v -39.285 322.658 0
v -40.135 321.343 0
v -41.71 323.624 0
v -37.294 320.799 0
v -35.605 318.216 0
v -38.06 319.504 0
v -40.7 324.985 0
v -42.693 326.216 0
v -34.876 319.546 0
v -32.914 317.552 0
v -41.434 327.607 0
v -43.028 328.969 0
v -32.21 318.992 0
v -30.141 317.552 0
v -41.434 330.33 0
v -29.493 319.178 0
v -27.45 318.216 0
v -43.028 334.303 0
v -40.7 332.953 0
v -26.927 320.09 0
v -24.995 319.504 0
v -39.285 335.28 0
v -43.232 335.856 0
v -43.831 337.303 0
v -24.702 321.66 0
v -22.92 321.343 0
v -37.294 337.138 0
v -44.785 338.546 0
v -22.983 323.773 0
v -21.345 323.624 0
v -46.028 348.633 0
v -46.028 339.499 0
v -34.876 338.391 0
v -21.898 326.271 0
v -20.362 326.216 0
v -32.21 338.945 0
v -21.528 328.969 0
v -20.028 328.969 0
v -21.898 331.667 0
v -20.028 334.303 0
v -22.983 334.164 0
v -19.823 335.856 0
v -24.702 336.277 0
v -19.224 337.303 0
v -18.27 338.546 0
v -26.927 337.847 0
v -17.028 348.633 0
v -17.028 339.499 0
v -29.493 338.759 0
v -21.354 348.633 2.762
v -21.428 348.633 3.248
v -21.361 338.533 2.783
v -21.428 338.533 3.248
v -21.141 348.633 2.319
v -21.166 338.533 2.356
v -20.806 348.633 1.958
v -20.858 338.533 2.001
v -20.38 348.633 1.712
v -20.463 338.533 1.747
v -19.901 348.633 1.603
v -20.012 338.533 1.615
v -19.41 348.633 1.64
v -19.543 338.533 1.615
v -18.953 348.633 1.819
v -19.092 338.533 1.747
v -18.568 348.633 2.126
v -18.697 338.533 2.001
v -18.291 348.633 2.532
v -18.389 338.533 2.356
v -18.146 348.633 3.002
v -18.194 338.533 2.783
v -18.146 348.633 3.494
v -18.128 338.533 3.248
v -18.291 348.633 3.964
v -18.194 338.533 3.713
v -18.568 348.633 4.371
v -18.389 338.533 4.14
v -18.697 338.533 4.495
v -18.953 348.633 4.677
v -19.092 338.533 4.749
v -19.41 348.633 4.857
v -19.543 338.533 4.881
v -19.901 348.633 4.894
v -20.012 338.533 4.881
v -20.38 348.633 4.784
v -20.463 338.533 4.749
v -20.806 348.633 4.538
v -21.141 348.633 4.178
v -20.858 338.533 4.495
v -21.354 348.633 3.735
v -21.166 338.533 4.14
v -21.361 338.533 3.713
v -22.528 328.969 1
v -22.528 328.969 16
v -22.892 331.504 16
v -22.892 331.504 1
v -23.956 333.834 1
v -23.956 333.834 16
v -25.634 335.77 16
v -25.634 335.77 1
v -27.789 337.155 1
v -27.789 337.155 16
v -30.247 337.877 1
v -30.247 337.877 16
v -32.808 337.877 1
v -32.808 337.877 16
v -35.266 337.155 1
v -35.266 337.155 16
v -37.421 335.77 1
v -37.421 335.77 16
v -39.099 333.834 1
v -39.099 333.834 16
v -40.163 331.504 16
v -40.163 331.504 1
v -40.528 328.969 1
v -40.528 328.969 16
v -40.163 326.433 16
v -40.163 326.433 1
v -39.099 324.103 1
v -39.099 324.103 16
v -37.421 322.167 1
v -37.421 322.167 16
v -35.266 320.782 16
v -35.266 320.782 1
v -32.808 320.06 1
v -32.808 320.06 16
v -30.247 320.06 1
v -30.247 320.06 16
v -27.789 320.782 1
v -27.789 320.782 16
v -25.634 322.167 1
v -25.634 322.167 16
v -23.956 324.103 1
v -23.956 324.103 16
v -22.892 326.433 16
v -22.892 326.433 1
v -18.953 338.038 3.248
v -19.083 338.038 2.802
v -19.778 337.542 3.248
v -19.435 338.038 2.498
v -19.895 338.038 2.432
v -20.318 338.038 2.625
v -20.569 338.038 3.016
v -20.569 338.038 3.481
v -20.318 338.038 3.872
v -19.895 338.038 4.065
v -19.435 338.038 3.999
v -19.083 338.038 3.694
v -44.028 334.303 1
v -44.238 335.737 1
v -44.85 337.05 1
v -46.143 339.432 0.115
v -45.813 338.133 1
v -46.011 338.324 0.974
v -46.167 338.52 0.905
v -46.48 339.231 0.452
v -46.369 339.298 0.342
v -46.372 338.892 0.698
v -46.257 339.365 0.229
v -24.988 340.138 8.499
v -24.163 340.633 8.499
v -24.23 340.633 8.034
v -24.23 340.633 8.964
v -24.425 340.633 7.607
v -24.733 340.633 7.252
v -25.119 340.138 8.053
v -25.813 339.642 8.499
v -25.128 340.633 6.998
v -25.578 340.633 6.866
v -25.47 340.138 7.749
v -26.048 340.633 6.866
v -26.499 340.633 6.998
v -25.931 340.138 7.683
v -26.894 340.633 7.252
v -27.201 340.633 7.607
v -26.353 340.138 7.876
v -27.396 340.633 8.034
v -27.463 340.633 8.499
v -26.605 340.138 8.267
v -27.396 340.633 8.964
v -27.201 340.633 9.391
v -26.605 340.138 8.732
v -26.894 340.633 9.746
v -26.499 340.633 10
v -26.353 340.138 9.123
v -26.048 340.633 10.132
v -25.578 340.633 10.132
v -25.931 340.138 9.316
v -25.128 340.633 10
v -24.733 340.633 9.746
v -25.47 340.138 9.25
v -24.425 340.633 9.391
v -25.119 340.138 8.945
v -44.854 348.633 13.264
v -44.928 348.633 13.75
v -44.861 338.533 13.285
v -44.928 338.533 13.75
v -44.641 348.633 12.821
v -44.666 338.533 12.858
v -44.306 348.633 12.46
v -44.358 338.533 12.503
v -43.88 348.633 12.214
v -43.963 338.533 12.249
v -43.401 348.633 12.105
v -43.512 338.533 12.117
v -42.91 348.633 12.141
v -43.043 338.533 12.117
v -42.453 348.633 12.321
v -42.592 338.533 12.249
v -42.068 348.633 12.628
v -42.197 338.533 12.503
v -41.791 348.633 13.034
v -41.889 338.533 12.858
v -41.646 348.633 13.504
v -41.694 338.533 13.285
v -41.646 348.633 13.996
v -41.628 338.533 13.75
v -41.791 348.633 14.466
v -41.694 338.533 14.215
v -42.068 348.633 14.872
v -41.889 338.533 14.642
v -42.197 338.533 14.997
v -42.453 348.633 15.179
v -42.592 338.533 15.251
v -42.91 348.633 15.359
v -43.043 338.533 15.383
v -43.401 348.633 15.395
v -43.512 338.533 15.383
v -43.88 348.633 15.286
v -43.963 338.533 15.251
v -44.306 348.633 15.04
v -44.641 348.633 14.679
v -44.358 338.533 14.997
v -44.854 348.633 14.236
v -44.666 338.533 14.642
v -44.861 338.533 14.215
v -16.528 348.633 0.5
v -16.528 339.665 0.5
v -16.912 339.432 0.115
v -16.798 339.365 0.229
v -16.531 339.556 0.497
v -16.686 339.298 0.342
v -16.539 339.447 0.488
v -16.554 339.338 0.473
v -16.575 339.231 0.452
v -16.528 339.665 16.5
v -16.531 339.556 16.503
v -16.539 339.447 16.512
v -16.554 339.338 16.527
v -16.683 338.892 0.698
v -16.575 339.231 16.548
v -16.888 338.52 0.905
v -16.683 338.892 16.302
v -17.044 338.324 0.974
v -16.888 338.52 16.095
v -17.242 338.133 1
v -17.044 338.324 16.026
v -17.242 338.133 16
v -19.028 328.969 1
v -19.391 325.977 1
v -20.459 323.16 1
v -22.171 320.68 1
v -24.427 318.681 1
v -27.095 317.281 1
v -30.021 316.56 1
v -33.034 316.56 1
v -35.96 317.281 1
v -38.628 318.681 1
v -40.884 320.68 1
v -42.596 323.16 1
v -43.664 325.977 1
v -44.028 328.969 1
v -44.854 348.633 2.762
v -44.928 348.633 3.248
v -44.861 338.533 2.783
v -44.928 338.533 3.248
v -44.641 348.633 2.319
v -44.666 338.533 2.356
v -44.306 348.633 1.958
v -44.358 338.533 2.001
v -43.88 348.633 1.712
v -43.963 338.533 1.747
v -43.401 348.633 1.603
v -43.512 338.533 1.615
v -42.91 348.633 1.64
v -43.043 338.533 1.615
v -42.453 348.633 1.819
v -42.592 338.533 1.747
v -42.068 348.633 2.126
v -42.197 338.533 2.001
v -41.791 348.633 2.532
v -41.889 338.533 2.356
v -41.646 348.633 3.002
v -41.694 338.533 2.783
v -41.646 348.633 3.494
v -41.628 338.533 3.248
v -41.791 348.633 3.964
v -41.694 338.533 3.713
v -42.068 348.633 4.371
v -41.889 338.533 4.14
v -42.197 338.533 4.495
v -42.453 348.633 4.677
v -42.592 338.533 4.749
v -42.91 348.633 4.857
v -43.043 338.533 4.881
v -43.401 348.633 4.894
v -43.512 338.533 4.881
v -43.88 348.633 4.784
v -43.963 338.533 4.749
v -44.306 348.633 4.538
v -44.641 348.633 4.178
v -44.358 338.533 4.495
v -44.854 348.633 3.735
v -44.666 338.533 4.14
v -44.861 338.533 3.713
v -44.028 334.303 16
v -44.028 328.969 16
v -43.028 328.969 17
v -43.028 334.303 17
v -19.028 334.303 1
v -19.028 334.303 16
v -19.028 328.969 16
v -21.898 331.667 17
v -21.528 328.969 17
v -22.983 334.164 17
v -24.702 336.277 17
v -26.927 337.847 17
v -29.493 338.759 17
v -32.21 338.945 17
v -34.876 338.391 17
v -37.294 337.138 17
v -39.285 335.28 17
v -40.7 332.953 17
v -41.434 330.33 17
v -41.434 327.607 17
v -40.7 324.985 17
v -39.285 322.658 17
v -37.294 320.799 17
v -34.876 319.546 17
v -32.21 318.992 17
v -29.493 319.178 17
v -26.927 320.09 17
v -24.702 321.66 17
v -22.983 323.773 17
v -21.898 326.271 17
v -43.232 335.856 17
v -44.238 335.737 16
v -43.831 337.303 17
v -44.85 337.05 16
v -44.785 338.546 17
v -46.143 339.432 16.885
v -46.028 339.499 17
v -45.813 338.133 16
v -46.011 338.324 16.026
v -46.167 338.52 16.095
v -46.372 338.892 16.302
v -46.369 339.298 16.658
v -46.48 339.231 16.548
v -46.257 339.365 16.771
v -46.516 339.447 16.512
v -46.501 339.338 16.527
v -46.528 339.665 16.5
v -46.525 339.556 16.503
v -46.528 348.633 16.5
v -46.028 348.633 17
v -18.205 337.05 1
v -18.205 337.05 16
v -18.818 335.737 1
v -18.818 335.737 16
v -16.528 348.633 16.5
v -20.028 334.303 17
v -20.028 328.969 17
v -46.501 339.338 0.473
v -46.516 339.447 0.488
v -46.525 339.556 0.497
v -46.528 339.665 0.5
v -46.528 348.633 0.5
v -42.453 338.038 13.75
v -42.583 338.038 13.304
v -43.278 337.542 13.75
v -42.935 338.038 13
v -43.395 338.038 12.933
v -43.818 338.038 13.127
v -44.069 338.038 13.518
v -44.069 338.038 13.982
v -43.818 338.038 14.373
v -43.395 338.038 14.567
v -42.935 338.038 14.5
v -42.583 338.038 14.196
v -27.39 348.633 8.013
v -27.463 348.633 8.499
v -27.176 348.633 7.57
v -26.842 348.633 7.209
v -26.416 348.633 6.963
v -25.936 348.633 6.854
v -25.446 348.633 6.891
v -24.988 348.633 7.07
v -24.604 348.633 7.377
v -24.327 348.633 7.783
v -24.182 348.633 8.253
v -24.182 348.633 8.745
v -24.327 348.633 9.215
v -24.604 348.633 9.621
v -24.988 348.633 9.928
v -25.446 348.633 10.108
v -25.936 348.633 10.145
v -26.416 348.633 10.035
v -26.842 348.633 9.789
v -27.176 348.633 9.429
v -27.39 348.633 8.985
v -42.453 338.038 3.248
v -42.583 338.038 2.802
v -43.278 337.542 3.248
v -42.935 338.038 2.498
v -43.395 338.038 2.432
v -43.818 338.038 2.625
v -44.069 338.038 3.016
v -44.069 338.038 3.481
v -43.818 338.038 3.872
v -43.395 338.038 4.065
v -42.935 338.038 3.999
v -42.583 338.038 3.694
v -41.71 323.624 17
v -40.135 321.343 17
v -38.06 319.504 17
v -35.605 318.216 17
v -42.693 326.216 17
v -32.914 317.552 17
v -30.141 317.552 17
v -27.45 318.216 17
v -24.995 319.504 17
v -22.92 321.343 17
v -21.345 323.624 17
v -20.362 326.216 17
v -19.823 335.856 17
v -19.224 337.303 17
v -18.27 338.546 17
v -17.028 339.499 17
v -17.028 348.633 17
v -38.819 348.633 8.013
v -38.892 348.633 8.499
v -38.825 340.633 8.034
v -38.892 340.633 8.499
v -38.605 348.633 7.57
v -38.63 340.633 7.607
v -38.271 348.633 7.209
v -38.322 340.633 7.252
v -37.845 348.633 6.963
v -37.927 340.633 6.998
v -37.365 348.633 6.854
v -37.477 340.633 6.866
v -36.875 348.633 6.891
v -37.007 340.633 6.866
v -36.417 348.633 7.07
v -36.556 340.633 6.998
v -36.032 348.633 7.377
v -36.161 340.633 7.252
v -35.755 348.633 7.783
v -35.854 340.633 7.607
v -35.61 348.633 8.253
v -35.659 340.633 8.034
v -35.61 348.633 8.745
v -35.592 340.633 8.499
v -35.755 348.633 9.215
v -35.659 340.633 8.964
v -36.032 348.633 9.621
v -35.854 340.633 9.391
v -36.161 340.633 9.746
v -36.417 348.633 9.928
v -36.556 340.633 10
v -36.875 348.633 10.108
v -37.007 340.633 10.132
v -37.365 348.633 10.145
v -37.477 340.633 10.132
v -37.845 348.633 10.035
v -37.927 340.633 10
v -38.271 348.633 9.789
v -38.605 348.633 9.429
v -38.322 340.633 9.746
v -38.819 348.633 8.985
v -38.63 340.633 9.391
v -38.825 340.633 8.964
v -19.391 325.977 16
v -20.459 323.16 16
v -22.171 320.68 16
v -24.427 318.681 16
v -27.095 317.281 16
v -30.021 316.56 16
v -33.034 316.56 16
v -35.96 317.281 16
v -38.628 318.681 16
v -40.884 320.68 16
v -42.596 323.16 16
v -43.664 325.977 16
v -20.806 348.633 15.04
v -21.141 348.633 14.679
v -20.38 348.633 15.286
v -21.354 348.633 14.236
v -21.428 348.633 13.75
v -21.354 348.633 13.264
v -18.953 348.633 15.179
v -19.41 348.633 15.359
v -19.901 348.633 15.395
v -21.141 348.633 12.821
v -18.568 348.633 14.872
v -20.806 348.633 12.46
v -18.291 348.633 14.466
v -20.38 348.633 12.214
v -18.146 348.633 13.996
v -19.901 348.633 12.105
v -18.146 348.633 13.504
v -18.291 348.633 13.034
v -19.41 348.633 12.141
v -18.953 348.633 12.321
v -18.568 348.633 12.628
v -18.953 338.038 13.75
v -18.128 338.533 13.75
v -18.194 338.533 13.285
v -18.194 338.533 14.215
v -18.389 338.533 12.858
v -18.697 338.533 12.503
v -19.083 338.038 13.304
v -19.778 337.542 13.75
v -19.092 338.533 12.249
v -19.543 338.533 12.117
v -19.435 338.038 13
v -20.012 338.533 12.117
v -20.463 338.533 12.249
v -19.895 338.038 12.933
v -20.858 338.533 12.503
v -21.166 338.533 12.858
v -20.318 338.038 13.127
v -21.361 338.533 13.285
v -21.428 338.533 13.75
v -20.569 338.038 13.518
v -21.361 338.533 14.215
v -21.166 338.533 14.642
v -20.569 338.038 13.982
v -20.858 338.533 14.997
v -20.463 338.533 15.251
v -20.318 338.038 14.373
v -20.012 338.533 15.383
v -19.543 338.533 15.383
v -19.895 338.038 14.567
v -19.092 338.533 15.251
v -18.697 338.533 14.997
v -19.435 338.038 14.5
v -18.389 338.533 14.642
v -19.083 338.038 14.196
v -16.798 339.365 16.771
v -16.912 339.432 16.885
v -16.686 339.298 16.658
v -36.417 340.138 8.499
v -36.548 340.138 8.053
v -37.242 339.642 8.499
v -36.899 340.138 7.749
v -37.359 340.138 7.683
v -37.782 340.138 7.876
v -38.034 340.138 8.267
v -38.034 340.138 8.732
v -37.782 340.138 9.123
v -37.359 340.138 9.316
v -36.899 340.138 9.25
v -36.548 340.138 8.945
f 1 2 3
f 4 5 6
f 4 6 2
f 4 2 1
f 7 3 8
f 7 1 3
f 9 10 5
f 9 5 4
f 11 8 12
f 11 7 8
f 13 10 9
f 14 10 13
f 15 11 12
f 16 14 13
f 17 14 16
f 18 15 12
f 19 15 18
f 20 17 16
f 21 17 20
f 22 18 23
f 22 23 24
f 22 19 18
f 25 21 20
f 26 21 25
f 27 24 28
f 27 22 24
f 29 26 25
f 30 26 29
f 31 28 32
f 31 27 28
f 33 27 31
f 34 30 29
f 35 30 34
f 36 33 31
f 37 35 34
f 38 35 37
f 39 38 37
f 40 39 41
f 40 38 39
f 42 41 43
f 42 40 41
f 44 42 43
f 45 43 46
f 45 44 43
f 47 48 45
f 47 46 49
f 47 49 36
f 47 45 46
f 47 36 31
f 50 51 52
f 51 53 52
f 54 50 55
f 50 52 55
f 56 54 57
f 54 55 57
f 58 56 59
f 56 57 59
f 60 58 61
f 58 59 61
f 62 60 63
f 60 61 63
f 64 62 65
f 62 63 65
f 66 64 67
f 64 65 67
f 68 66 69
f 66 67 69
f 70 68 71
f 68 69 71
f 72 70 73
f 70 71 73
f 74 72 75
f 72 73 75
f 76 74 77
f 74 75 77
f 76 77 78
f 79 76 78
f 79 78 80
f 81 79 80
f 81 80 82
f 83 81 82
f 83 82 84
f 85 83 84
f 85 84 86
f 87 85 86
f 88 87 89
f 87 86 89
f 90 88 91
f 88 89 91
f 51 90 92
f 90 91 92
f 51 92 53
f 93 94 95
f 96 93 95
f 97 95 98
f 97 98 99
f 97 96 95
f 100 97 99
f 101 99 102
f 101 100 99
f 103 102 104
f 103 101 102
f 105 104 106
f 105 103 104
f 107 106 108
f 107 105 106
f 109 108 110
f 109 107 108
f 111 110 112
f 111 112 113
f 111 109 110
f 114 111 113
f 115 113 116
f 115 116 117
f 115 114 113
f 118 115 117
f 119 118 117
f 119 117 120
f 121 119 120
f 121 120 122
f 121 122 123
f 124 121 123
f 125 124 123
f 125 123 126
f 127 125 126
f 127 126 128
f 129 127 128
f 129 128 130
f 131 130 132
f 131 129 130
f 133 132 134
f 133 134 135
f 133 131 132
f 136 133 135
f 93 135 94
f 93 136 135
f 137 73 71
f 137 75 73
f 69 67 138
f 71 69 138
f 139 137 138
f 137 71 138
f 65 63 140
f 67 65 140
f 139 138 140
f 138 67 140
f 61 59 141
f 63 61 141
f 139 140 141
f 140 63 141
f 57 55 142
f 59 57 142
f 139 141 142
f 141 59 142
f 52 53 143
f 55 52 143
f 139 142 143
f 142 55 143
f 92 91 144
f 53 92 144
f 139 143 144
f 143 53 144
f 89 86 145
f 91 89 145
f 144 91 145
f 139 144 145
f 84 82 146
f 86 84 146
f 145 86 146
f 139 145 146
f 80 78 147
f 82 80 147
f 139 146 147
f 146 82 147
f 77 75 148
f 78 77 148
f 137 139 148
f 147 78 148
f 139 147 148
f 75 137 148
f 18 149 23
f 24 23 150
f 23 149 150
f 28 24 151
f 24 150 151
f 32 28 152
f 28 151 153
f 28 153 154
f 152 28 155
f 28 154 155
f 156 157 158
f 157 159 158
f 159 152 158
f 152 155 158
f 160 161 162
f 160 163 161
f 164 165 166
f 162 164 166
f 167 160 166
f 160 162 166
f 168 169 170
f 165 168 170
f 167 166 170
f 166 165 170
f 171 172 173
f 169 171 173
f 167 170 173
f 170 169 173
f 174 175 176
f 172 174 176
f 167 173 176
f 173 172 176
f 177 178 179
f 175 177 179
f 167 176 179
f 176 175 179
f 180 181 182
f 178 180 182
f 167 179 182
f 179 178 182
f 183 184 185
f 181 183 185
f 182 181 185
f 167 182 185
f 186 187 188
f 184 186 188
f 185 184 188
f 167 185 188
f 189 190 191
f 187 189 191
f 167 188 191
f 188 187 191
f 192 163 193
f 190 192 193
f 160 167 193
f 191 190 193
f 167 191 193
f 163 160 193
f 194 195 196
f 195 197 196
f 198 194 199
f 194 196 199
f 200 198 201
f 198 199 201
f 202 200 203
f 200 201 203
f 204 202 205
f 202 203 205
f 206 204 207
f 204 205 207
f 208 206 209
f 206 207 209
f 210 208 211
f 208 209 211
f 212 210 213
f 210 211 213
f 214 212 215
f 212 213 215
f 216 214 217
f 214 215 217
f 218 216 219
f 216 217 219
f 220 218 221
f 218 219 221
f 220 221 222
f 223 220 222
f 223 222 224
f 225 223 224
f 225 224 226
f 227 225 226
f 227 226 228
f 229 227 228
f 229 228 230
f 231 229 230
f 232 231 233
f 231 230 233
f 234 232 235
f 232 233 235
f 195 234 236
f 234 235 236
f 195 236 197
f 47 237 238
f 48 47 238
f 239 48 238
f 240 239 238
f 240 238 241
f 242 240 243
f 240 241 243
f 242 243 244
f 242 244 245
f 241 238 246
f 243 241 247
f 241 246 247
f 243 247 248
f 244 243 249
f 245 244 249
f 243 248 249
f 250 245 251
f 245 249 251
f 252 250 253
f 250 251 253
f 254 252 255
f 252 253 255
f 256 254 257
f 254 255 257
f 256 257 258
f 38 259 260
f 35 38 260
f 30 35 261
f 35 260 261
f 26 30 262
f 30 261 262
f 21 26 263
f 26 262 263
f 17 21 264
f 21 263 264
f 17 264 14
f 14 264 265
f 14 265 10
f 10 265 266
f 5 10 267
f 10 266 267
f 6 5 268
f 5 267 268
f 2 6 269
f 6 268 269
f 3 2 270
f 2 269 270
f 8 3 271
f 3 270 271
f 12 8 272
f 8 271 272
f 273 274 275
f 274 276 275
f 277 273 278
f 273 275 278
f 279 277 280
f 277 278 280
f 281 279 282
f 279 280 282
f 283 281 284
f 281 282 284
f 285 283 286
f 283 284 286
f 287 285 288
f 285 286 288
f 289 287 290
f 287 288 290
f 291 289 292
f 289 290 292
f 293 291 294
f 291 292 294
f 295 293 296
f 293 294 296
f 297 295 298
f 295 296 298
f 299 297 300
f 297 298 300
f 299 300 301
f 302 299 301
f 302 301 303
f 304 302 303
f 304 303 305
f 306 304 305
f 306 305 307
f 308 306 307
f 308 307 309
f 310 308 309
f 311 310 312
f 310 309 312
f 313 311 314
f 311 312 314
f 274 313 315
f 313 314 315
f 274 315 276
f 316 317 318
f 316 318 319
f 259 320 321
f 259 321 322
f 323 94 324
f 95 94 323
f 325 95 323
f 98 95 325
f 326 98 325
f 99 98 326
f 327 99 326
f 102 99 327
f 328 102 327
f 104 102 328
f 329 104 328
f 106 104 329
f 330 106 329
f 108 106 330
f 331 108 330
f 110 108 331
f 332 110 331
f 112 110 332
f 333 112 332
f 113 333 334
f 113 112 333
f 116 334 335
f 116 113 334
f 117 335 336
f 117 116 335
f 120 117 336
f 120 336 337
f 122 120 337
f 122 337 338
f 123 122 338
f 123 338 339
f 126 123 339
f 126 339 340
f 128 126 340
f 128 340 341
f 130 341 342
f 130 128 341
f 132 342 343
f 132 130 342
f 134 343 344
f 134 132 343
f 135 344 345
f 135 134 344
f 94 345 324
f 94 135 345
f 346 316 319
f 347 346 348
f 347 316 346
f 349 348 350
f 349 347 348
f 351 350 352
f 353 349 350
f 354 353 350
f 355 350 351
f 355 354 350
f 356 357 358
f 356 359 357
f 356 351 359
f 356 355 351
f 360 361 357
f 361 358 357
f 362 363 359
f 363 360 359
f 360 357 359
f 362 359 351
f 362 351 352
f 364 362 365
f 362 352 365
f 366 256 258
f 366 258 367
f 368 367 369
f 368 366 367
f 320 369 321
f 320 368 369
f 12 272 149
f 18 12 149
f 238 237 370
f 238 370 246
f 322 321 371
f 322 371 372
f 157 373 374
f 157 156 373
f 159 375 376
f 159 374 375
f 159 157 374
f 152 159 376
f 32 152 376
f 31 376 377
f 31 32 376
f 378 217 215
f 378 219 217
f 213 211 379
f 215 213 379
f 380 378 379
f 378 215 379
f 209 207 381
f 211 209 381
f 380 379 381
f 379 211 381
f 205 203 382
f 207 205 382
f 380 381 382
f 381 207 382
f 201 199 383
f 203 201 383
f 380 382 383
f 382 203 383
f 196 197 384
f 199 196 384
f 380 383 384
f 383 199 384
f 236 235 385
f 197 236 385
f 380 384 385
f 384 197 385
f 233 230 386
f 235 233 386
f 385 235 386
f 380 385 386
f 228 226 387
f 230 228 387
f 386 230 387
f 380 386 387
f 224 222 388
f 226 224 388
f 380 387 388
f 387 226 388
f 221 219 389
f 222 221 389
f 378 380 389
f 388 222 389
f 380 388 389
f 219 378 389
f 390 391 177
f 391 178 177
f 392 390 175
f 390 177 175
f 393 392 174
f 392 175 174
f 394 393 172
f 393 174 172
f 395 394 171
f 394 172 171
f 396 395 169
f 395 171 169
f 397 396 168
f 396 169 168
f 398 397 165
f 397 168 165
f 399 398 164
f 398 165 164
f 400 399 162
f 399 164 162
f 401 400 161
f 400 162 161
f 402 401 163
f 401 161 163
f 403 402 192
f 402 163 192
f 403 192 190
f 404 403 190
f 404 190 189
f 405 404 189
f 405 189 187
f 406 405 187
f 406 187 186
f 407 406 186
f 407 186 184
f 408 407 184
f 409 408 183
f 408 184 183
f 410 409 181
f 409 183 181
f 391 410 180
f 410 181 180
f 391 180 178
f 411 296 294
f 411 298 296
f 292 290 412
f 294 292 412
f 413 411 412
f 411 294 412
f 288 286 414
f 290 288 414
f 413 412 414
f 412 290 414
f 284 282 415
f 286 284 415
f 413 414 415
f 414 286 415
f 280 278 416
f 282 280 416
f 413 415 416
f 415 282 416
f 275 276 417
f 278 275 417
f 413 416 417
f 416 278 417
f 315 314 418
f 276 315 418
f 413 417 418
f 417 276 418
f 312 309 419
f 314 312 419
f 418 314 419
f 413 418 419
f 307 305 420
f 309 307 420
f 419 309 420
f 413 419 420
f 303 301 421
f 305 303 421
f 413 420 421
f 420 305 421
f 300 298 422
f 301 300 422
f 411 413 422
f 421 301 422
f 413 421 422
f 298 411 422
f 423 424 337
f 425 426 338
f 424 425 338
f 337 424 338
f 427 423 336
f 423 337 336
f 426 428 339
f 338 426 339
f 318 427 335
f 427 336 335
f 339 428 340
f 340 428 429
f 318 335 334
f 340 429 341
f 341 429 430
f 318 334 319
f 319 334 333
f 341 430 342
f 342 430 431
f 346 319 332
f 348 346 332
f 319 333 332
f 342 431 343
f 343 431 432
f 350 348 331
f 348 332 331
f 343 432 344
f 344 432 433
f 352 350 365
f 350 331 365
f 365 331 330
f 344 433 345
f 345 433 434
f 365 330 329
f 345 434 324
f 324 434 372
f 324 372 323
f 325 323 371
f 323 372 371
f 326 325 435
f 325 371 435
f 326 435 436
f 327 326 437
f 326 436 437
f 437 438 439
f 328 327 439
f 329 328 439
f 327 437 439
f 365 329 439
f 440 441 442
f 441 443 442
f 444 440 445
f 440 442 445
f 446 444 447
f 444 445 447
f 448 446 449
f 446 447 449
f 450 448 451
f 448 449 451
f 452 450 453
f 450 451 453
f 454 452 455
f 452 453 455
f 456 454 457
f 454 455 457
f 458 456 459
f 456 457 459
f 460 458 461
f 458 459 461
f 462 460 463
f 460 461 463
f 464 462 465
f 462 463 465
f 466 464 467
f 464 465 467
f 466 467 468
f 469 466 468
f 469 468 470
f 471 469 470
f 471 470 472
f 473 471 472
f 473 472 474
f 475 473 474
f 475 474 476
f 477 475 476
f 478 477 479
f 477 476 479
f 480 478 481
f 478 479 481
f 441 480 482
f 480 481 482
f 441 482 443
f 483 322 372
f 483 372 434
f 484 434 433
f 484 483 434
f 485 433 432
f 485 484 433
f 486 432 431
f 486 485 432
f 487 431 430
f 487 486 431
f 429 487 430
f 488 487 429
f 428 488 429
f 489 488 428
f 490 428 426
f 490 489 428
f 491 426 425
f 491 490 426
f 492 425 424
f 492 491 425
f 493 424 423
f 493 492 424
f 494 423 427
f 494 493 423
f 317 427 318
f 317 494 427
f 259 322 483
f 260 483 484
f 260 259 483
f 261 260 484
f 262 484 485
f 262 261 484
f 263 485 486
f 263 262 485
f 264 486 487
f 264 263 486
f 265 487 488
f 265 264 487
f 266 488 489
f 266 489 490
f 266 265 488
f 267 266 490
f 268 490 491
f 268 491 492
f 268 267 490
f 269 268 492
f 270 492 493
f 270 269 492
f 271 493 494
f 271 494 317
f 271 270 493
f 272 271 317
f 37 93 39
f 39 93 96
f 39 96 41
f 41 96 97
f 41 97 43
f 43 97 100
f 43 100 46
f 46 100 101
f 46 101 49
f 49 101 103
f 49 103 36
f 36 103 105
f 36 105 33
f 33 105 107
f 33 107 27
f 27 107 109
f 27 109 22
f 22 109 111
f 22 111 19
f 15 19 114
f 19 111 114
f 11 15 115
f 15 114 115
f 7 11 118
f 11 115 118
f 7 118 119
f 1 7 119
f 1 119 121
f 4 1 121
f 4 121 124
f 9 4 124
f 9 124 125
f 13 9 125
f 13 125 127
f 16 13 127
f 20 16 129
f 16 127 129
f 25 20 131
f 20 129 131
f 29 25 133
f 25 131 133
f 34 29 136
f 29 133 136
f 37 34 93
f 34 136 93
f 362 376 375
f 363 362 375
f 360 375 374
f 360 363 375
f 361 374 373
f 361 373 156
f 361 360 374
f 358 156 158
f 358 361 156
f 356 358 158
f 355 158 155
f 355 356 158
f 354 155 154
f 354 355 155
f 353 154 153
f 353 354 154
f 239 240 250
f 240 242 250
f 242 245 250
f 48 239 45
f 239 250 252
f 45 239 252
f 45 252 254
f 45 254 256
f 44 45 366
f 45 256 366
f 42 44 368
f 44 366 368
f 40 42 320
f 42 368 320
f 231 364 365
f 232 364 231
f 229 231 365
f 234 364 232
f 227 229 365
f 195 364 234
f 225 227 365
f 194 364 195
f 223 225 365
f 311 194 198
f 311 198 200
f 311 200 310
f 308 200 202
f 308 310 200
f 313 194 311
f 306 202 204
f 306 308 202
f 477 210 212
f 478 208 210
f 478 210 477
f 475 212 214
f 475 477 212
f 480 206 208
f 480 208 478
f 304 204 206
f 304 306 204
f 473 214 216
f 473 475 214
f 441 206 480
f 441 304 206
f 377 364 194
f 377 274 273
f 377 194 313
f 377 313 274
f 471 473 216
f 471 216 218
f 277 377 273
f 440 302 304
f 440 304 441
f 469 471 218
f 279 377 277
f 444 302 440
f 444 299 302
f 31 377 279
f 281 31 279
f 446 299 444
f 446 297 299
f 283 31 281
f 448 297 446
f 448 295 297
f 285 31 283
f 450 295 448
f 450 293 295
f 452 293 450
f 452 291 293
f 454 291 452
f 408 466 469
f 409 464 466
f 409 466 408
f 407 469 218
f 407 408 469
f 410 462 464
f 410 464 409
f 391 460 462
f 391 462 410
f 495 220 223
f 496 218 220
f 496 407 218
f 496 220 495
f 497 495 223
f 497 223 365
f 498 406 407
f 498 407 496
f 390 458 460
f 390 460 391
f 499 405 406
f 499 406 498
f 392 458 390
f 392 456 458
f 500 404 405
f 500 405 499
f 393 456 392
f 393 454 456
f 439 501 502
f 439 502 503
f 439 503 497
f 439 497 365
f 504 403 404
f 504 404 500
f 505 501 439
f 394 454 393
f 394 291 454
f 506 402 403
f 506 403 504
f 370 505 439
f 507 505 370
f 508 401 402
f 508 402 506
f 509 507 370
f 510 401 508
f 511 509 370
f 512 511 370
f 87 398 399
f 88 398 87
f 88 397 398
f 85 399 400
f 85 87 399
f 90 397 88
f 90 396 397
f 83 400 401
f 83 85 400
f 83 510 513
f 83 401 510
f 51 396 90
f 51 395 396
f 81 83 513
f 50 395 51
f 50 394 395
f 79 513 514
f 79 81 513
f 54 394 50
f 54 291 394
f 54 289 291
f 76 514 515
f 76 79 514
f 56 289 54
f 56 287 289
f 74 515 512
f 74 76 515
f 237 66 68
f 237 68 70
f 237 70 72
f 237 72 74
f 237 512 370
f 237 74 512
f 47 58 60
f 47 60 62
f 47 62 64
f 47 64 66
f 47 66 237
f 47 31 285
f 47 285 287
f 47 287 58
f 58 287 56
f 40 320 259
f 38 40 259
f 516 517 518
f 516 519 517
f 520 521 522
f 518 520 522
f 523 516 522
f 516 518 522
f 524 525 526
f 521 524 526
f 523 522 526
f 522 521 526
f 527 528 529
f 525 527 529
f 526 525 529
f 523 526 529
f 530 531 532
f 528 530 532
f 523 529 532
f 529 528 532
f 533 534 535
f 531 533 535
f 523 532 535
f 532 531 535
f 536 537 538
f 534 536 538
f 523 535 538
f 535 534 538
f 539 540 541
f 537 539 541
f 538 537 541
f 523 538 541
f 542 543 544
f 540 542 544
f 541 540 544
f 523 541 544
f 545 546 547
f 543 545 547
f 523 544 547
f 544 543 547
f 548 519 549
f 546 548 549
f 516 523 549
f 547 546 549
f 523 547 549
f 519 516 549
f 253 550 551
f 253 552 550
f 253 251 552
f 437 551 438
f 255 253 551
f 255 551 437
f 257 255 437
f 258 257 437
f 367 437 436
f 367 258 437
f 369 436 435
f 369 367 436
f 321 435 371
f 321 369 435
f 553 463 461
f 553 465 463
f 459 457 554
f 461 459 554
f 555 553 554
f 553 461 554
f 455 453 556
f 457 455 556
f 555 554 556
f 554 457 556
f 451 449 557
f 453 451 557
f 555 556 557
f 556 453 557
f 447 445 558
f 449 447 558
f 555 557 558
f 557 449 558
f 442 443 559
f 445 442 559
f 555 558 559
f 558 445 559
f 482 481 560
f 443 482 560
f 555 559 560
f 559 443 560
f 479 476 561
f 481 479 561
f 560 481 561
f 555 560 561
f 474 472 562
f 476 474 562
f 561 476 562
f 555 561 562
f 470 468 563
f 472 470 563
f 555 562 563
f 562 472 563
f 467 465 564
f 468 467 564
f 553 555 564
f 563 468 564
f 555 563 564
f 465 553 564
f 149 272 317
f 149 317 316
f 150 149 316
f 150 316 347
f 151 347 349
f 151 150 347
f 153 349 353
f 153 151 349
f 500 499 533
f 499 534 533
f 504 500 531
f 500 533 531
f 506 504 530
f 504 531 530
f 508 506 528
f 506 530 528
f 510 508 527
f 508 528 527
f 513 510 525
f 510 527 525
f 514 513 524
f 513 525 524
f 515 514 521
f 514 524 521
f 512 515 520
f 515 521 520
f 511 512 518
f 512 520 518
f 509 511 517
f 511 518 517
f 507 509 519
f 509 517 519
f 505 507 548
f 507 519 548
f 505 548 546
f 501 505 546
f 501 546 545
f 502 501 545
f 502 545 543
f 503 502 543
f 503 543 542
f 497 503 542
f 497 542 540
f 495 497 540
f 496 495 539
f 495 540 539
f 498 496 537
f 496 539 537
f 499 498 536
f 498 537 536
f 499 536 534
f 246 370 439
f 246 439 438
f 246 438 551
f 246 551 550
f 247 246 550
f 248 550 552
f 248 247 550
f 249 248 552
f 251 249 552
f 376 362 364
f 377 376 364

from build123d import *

# Parameters (mm, degrees)
SKETCH_1_R             = 9
EXTRUDE_2_DEPTH        = 17
FILLET_7_R             = 5
CHAMFER_3_SIZE         = 1
CHAMFER_4_SIZE         = 1
CHAMFER_5_SIZE         = 0.5
FILLET_9_R             = 2
HOLE_WIZARD_M4_3_D     = 3.3
HOLE_WIZARD_M4_3_DEPTH = 10.1
HOLE_WIZARD_M4_3_TIP   = 0.991420021
HOLE_WIZARD_M4_4_D     = 3.3
HOLE_WIZARD_M4_4_DEPTH = 8
HOLE_WIZARD_M4_4_TIP   = 0.991420021


with BuildPart() as part:
    # 草图1 → 凸台-拉伸2 (new body)
    with BuildSketch(Plane.XY):
        with BuildLine():
            Line((-16.527519938, 348.633233256), (-16.527519938, 338.633233256))
            Line((-16.527519938, 338.633233256), (-19.027519938, 338.633233256))
            Line((-19.027519938, 338.633233256), (-19.027519938, 328.968626967))
            ThreePointArc((-19.027519938, 328.968626967), (-31.527519938, 316.468626967), (-44.027519938, 328.968626967))
            Line((-44.027519938, 328.968626967), (-44.027519938, 338.633233256))
            Line((-44.027519938, 338.633233256), (-46.527519938, 338.633233256))
            Line((-46.527519938, 338.633233256), (-46.527519938, 348.633233256))
            Line((-46.527519938, 348.633233256), (-16.527519938, 348.633233256))
        make_face()
        with Locations((-31.527519938, 328.968626967)):
            Circle(SKETCH_1_R, mode=Mode.SUBTRACT)
    extrude(amount=EXTRUDE_2_DEPTH)

    # 圆角7
    # the kernel refuses this fillet: 5 mm, written as the material it adds along each edge
    with BuildSketch(Plane(origin=(-19.027519938, 338.633233256, 0), x_dir=(1, 0, 0), z_dir=(0, 0, 1))) as fillet_7_piece_1:
        with BuildLine():
            CenterArc((5, -4.330127019), FILLET_7_R, 120, 60)
            Line((0, -4.330127019), (-0.1, -4.330127019))
            Line((-0.1, -4.330127019), (-0.1, 0))
            Line((-0.1, 0), (0, 0.1))
            ThreePointArc((0, 0.1), (1.25, 0.1), (2.45, 0.08660254))
            Line((2.45, 0.08660254), (2.5, 0))
        make_face()
    extrude(amount=17)
    with BuildSketch(Plane(origin=(-44.027519938, 338.633233256, 0), x_dir=(0, -1, 0), z_dir=(0, 0, 1))) as fillet_7_piece_2:
        with BuildLine():
            CenterArc((4.330127019, -5), FILLET_7_R, 90, 60)
            Line((0, -2.5), (-0.08660254, -2.45))
            ThreePointArc((-0.08660254, -2.45), (-0.1, -1.25), (-0.1, 0))
            Line((-0.1, 0), (0, 0.1))
            Line((0, 0.1), (4.330127019, 0.1))
            Line((4.330127019, 0.1), (4.330127019, 0))
        make_face()
    extrude(amount=17)

    # 倒角3
    chamfer_3_edges = [part.edges().sort_by_distance(p)[0] for p in [
        (-31.527519938, 316.468626967, 17),
        (-19.027519938, 331.635866602, 17),
        (-44.027519938, 331.635866602, 17),
        (-18.357646957, 336.803106237, 17),
        (-44.697392919, 336.803106237, 17),
    ]]
    chamfer(chamfer_3_edges, length=CHAMFER_3_SIZE)

    # 倒角4
    chamfer_4_edges = [part.edges().sort_by_distance(p)[0] for p in [
        (-19.027519938, 331.635866602, 0),
        (-31.527519938, 316.468626967, 0),
        (-40.527519938, 328.968626967, 0),
        (-40.527519938, 328.968626967, 17),
        (-44.027519938, 331.635866602, 0),
        (-18.357646957, 336.803106237, 0),
        (-44.697392919, 336.803106237, 0),
    ]]
    chamfer(chamfer_4_edges, length=CHAMFER_4_SIZE)

    # 倒角5
    chamfer_5_edges = [part.edges().sort_by_distance(p)[0] for p in [
        (-16.527519938, 344.195347776, 0),
        (-16.527519938, 344.195347776, 17),
        (-46.527519938, 344.195347776, 0),
        (-46.527519938, 344.195347776, 17),
    ]]
    chamfer(chamfer_5_edges, length=CHAMFER_5_SIZE)

    # 圆角9
    fillet_9_edges = [part.edges().sort_by_distance(p)[0] for p in [
        (-16.527519938, 338.633233256, 8.5),
        (-46.527519938, 338.633233256, 8.5),
    ]]
    fillet(fillet_9_edges, radius=FILLET_9_R)

    # M4 螺纹孔3
    with Locations(Plane(origin=(0, 348.633233256, 0), x_dir=(1, 0, 0), z_dir=(0, 1, 0))):
        with Locations((-19.777519938, -13.75), (-43.277519938, -13.75), (-43.277519938, -3.248268424), (-19.777519938, -3.248268424)):
            Hole(HOLE_WIZARD_M4_3_D / 2, depth=HOLE_WIZARD_M4_3_DEPTH)
            with Locations((0, 0, -(HOLE_WIZARD_M4_3_DEPTH + HOLE_WIZARD_M4_3_TIP / 2))):  # 118° drill point
                Cone(0, HOLE_WIZARD_M4_3_D / 2, HOLE_WIZARD_M4_3_TIP, mode=Mode.SUBTRACT)

    # M4 螺纹孔4
    with Locations(Plane(origin=(0, 348.633233256, 0), x_dir=(1, 0, 0), z_dir=(0, 1, 0))):
        with Locations((-37.241924816, -8.499134212), (-25.81311506, -8.499134212)):
            Hole(HOLE_WIZARD_M4_4_D / 2, depth=HOLE_WIZARD_M4_4_DEPTH)
            with Locations((0, 0, -(HOLE_WIZARD_M4_4_DEPTH + HOLE_WIZARD_M4_4_TIP / 2))):  # 118° drill point
                Cone(0, HOLE_WIZARD_M4_4_D / 2, HOLE_WIZARD_M4_4_TIP, mode=Mode.SUBTRACT)


solid = part.part
